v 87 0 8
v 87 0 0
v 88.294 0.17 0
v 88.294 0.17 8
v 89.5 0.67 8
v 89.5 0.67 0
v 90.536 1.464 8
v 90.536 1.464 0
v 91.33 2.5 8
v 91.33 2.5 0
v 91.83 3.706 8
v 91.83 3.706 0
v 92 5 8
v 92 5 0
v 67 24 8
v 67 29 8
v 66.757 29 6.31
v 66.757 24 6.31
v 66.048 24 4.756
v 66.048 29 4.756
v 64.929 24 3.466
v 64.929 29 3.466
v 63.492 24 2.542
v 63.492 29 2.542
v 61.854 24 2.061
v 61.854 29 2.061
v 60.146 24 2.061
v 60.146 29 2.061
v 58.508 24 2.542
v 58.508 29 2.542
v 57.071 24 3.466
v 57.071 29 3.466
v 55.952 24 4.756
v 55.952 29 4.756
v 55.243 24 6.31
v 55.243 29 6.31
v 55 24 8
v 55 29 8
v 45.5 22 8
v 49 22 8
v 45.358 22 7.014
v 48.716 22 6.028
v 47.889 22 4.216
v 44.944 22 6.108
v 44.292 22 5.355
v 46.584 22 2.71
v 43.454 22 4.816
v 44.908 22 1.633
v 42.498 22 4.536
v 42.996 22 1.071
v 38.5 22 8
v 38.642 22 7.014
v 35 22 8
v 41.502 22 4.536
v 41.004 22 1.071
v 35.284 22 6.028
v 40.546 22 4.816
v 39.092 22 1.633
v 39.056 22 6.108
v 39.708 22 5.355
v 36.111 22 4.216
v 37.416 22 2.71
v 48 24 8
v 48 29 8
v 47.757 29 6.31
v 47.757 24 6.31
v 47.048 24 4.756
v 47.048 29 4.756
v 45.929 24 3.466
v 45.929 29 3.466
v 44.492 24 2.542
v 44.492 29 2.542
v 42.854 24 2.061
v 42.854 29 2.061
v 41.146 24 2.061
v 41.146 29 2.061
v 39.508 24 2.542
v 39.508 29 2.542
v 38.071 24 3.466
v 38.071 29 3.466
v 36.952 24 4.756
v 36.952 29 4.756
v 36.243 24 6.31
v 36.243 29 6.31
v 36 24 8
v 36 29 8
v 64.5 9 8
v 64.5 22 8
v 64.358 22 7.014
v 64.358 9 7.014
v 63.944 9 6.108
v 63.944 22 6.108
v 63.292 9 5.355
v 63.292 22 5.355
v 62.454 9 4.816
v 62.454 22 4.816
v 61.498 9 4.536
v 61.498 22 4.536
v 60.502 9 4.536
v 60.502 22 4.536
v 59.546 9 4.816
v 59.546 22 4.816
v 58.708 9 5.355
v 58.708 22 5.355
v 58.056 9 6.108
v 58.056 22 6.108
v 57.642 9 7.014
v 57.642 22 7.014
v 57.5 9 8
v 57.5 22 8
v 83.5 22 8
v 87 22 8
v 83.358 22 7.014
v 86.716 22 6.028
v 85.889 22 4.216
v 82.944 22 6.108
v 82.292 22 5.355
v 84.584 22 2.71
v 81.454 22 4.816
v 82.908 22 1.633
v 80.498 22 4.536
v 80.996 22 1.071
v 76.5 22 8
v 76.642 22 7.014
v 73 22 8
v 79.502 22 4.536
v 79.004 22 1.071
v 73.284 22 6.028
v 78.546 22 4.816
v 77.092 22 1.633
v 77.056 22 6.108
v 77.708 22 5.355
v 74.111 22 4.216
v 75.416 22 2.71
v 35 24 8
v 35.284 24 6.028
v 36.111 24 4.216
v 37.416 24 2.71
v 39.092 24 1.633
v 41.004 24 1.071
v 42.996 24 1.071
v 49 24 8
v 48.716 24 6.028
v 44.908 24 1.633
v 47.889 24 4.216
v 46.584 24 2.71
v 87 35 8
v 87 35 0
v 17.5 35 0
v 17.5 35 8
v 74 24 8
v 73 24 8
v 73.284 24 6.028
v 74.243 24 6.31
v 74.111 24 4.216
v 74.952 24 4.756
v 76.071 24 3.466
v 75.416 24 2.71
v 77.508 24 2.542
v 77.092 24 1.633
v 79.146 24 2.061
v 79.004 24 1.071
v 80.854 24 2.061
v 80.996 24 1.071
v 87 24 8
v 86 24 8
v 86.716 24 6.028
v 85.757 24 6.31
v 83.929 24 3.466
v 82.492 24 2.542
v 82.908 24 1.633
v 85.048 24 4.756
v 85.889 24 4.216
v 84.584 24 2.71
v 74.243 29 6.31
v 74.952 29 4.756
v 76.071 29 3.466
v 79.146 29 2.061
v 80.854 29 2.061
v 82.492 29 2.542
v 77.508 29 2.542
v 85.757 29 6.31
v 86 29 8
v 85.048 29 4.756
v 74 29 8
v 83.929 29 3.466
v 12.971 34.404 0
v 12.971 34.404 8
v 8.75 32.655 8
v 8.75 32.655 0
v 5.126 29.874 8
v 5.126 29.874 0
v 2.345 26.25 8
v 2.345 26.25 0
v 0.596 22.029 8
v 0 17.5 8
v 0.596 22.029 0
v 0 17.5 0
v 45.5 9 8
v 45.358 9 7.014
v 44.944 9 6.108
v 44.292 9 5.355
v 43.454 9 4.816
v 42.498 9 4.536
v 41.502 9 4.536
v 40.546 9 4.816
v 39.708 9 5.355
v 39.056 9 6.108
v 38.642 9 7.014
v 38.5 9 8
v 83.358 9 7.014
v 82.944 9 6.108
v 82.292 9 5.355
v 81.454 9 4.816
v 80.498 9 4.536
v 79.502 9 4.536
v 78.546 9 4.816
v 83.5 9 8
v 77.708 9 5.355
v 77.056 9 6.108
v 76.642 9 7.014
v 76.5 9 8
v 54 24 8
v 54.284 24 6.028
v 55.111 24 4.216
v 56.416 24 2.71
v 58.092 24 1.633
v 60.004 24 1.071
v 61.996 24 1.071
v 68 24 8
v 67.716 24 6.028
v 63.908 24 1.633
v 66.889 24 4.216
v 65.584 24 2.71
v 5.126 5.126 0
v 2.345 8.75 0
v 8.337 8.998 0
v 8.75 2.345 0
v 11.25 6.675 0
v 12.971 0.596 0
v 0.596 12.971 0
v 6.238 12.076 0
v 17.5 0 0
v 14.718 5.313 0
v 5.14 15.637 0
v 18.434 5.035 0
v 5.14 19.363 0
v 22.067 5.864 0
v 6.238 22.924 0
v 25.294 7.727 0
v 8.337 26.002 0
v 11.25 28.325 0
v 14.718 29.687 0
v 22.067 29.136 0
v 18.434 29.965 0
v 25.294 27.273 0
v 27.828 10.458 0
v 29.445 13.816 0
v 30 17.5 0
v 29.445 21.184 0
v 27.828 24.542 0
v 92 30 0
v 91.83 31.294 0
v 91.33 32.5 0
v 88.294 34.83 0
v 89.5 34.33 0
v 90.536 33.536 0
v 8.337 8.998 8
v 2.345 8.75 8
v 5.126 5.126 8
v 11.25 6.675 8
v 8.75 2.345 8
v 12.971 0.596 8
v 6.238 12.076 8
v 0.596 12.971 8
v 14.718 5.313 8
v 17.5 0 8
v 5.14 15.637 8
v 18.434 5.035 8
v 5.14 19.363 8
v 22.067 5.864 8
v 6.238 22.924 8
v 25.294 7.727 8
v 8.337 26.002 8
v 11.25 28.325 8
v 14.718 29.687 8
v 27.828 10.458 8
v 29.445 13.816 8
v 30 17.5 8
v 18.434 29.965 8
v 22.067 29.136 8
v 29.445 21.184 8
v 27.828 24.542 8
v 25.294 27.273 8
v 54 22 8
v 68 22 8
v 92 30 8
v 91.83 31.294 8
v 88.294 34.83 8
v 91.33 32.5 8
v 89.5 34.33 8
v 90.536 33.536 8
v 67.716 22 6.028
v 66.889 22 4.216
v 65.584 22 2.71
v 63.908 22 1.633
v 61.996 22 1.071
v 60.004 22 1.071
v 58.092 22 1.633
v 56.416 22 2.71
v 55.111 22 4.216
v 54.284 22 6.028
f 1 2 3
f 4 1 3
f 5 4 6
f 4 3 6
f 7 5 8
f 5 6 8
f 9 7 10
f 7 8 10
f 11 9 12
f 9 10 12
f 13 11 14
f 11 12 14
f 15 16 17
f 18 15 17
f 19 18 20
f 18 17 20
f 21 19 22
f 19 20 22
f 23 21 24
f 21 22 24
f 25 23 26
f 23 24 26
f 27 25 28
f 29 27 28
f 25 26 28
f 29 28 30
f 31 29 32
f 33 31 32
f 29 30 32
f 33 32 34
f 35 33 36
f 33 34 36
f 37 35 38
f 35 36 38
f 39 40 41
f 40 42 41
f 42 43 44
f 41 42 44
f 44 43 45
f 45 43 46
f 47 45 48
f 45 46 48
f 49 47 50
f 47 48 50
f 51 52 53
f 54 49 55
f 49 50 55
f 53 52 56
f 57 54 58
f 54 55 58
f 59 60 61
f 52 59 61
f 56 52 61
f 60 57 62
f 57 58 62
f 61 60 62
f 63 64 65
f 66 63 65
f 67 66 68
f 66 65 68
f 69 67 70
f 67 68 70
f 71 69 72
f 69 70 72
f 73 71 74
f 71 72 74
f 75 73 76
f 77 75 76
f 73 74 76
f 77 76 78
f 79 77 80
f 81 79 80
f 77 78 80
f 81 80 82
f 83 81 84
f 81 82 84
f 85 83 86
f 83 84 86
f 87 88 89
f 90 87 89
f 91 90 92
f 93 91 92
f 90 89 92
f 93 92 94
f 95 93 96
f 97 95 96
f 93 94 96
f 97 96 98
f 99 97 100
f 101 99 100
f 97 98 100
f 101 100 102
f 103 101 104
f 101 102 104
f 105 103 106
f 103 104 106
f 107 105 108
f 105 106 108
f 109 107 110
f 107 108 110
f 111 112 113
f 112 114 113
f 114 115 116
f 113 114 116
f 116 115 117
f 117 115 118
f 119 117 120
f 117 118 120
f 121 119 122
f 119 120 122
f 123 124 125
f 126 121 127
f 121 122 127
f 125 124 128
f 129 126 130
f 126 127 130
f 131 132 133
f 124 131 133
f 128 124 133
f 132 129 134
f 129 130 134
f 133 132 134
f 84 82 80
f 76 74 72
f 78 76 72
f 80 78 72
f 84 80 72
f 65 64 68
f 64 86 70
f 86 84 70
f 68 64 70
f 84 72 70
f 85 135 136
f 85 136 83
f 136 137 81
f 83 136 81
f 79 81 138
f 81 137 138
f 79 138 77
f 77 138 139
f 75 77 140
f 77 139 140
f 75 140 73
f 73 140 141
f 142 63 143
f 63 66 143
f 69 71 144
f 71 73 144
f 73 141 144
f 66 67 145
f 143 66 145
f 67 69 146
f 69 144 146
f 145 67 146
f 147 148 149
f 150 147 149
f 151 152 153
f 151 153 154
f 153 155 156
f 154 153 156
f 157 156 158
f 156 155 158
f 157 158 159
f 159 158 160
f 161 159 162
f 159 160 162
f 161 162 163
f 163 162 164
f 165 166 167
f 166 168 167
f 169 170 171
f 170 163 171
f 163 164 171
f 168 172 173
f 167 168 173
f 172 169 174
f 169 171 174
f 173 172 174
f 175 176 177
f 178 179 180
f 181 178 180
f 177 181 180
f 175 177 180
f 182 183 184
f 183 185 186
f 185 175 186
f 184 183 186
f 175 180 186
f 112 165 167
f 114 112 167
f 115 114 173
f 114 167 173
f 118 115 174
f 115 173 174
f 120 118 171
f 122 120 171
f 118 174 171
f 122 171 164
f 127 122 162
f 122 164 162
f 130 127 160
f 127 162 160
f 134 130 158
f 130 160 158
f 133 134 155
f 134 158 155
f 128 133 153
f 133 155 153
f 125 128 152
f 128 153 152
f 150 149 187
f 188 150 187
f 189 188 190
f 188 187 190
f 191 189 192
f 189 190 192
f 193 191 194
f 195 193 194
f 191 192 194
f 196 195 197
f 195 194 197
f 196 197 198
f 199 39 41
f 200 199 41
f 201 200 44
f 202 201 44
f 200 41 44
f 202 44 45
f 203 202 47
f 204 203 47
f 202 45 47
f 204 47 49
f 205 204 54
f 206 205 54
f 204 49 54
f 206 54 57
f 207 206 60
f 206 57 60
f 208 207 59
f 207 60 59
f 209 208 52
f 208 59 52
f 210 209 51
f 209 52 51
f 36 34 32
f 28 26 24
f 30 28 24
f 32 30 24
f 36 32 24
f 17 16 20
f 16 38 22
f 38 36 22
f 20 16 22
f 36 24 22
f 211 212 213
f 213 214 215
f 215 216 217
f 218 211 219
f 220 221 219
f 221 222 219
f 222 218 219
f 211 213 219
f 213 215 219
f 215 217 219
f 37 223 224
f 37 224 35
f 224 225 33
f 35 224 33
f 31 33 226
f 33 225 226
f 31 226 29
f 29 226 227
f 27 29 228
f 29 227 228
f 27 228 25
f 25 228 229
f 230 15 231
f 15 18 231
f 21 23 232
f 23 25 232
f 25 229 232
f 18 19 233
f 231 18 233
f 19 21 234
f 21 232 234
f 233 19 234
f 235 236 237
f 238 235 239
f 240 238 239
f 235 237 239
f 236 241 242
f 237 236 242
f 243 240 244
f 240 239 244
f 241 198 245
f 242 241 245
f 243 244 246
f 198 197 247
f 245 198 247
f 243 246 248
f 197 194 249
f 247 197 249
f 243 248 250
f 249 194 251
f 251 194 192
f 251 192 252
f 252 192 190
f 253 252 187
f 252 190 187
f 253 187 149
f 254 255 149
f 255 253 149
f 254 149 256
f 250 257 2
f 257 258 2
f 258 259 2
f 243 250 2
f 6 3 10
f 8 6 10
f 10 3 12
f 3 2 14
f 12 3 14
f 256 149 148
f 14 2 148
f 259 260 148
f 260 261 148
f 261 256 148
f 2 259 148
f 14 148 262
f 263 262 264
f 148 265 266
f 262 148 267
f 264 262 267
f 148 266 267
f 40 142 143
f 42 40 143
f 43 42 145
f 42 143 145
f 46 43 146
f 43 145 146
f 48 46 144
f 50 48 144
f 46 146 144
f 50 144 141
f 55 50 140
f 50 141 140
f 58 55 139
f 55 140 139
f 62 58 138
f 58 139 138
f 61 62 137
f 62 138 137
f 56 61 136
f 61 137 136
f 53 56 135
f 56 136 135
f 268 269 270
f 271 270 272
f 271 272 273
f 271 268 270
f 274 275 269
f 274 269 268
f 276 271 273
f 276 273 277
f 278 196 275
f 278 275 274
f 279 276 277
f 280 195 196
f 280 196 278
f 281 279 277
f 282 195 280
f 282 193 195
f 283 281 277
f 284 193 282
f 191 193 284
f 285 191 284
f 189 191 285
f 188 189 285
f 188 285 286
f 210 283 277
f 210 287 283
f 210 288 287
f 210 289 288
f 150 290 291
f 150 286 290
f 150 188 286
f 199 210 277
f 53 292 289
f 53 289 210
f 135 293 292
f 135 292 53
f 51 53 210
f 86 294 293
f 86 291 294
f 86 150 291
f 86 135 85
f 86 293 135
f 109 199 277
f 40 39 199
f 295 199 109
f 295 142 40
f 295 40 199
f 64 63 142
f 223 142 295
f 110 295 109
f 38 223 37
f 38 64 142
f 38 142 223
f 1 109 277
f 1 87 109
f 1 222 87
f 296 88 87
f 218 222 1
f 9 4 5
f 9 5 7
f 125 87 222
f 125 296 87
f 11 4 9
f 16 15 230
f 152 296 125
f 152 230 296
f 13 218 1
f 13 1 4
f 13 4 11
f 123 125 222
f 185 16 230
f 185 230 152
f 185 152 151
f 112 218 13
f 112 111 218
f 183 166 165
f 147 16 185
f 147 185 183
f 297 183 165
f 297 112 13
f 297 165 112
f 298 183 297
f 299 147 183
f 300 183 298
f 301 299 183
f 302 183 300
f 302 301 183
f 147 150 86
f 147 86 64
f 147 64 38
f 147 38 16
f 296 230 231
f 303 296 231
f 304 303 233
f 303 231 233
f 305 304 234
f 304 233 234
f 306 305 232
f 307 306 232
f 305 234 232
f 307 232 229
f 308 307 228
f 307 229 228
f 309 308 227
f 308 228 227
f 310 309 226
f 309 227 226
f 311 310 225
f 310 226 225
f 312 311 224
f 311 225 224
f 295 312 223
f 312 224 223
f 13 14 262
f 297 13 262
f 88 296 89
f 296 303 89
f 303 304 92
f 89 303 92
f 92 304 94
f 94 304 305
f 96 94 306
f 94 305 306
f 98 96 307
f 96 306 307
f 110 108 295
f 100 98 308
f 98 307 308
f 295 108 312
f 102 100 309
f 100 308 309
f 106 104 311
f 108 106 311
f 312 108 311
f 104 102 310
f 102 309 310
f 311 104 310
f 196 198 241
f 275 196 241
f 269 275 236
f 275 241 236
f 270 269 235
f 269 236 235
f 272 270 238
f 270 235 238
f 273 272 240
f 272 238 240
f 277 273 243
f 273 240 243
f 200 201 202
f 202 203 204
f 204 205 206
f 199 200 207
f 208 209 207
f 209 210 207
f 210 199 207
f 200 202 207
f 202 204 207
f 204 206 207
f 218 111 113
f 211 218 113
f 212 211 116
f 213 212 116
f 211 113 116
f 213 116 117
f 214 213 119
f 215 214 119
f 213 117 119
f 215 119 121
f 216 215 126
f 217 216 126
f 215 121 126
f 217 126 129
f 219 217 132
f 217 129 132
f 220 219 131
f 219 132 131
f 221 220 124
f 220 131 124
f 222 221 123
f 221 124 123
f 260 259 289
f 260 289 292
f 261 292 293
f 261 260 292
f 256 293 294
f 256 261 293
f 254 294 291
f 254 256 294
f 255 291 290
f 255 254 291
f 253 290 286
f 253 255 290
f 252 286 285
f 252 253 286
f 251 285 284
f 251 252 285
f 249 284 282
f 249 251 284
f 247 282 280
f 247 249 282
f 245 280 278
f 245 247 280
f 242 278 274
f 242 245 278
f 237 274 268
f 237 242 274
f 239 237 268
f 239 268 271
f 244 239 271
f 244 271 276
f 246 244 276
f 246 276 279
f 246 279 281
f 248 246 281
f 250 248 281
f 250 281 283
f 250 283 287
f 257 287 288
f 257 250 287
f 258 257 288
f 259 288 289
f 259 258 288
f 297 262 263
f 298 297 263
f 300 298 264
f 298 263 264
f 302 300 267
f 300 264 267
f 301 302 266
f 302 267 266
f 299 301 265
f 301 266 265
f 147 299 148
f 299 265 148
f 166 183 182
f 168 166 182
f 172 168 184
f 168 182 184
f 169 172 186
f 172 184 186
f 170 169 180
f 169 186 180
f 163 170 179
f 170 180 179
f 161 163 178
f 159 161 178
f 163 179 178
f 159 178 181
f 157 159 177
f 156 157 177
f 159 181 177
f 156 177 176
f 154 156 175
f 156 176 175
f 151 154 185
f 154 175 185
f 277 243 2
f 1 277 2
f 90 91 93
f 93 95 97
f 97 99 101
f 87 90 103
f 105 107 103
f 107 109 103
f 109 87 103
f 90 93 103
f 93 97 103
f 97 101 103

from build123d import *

# Parameters (mm, degrees)
F0_R     = 12.5
F1_DEPTH = 8


with BuildPart() as f1:
    # F0 (on Top) → F1 (new body)
    with BuildSketch(Plane.XY):
        with BuildLine():
            ThreePointArc((0, 17.5), (5.125631, 5.125631), (17.5, 0))
            Line((17.5, 0), (87, 0))
            ThreePointArc((87, 0), (90.535534, 1.464466), (92, 5))
            Line((92, 5), (92, 30))
            ThreePointArc((92, 30), (90.535534, 33.535534), (87, 35))
            Line((87, 35), (17.5, 35))
            ThreePointArc((17.5, 35), (5.125631, 29.874369), (0, 17.5))
        make_face()
        with Locations((17.5, 17.5)):
            Circle(F0_R, mode=Mode.SUBTRACT)
    extrude(amount=F1_DEPTH)

    # F2 (on face) → F3 (revolve, cut)
    with BuildSketch(Plane.XY.offset(8)):
        Polygon((42, 22), (42, 9), (45.5, 9), (45.5, 22), (49, 22), (49, 24), (48, 24), (48, 29), (42, 29), (42, 24), align=None)
    revolve(axis=Axis((42, 15.5, 8), (0, 1, 0)), mode=Mode.SUBTRACT)

    # F2 (on face) → F4 (revolve, cut)
    with BuildSketch(Plane.XY.offset(8)):
        Polygon((61, 22), (61, 9), (64.5, 9), (64.5, 22), (68, 22), (68, 24), (67, 24), (67, 29), (61, 29), (61, 24), align=None)
    revolve(axis=Axis((61, 15.5, 8), (0, 1, 0)), mode=Mode.SUBTRACT)

    # F2 (on face) → F5 (revolve, cut)
    with BuildSketch(Plane.XY.offset(8)):
        Polygon((80, 22), (80, 9), (83.5, 9), (83.5, 22), (87, 22), (87, 24), (86, 24), (86, 29), (80, 29), (80, 24), align=None)
    revolve(axis=Axis((80, 15.5, 8), (0, 1, 0)), mode=Mode.SUBTRACT)


solid = f1.part
